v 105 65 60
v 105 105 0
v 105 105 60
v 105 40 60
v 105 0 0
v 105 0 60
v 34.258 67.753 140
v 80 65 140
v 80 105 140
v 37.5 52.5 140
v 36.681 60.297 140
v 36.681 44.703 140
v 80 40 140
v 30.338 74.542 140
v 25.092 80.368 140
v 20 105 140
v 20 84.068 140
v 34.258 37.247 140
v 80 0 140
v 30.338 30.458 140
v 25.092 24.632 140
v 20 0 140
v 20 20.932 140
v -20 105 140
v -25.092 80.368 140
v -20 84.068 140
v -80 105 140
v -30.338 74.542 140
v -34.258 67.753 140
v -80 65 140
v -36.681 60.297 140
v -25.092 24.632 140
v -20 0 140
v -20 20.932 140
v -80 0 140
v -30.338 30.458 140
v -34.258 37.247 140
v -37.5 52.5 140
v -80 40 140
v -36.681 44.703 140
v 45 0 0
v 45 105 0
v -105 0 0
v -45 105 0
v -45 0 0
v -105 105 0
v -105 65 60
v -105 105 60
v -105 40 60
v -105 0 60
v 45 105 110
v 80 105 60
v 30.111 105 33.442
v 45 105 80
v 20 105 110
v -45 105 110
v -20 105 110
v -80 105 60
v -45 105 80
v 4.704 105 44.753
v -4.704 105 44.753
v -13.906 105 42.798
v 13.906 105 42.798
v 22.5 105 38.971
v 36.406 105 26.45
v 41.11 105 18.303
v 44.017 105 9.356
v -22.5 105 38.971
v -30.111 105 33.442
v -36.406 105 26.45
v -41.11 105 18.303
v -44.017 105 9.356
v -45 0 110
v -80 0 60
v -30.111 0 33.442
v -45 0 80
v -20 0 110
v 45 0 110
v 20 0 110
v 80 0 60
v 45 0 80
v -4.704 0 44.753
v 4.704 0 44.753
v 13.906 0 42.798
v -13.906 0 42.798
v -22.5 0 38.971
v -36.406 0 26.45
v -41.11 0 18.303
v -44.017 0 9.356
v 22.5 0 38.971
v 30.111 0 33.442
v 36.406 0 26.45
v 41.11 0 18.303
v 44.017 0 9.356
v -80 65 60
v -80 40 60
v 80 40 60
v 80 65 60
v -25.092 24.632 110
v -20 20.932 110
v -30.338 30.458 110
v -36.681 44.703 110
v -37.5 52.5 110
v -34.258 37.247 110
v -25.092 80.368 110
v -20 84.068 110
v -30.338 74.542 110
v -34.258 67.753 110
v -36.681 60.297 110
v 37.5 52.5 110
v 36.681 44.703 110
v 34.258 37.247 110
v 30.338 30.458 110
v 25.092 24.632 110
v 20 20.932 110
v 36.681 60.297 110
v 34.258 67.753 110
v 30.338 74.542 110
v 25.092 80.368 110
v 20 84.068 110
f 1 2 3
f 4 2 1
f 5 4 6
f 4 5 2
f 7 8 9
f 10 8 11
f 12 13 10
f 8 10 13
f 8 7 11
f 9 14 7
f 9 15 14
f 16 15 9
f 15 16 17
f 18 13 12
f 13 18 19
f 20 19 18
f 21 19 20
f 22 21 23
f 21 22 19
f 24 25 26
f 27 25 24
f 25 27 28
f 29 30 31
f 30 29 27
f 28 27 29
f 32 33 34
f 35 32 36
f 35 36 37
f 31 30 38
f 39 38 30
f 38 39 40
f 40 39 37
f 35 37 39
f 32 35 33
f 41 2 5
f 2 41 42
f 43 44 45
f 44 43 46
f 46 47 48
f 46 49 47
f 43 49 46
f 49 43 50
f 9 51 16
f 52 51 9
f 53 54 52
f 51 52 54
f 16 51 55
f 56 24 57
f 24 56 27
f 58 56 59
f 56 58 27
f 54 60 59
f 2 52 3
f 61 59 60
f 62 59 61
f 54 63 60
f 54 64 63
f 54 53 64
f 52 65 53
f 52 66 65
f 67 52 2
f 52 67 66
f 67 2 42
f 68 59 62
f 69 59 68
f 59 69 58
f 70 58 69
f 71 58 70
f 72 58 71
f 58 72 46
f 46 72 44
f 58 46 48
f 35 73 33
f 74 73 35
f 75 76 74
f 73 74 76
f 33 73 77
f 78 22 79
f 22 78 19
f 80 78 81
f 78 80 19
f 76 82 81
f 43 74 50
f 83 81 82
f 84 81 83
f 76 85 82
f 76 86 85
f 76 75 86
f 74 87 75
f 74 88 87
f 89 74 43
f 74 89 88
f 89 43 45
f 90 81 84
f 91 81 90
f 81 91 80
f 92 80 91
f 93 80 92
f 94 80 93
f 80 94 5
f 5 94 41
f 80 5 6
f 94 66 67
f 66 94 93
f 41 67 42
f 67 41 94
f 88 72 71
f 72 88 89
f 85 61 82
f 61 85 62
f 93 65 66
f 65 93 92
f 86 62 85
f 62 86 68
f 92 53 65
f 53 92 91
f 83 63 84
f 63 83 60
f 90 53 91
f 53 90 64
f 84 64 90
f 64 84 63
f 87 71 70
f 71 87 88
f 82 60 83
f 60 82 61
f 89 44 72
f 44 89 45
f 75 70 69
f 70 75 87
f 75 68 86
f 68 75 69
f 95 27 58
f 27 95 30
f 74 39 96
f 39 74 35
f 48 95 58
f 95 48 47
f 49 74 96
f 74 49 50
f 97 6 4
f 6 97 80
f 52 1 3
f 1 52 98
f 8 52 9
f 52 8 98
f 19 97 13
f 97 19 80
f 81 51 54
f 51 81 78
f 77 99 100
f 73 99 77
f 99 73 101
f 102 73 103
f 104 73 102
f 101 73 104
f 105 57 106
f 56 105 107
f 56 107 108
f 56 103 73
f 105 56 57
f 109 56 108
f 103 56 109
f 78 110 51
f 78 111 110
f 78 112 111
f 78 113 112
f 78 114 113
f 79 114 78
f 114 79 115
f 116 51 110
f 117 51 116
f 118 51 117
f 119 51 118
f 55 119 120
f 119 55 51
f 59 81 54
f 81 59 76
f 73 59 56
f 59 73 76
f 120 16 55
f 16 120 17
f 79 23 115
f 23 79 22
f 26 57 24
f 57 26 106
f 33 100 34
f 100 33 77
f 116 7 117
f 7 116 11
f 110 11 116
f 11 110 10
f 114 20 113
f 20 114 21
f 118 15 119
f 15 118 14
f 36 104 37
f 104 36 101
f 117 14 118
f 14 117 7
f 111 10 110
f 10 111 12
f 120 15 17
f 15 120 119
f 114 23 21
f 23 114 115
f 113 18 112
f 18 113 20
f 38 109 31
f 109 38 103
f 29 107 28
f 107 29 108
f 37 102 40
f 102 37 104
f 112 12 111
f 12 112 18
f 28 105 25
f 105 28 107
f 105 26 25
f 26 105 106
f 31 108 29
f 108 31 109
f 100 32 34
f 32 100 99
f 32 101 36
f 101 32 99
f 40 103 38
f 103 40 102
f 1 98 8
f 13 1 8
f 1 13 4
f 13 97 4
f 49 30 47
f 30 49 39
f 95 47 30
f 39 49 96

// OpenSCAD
centeredCylinderCutRadius = 45;

centerCubeMainWidth = 210;
centerCubeMainDepth = 105;
centerCubeMainHeight = 140;

outsideCubeCutsWidth = 25;
    cubeHeightOffset = 60;
    cubeOffTheTop = 50;

InsideCubeCutHeight = 30;
InsideCubeCutWidth = 90;

centerCubeTallCutDepth = 40;
centerCubeTallCutHeight = 50;

topCylinderCutRadius = 37.50;


difference(){
    translate([ -centerCubeMainWidth / 2, 0, 0])
    cube([centerCubeMainWidth, centerCubeMainDepth, centerCubeMainHeight]);//Stock block
    
    rotate([ -90, 0, 0])
    cylinder(centerCubeMainDepth,r = centeredCylinderCutRadius,true);//Bottum cylinder cut
    
    translate([ -centerCubeMainWidth / 2, 0, cubeHeightOffset])
    cube([outsideCubeCutsWidth, centerCubeMainDepth, centerCubeMainHeight]);//Negative Outer Edge Cut
    
    translate([ centerCubeMainWidth / 2 - outsideCubeCutsWidth, 0, cubeHeightOffset])
    cube([outsideCubeCutsWidth, centerCubeMainDepth, centerCubeMainHeight]);//Negative Outer Edge Cut
    
    translate([-InsideCubeCutWidth / 2, 0,centerCubeMainHeight - cubeHeightOffset])
    cube([InsideCubeCutWidth, centerCubeMainDepth, InsideCubeCutHeight]);// Top Center Cut Wide
    
    translate([-centerCubeTallCutDepth / 2, 0,centerCubeMainHeight - centerCubeTallCutHeight])
    cube([centerCubeTallCutDepth, centerCubeMainDepth, centerCubeTallCutHeight]);// Top Center Cut Tall
    
    translate([0, centerCubeMainDepth / 2, centerCubeMainHeight - centerCubeTallCutHeight])
    cylinder(centerCubeTallCutHeight,r = topCylinderCutRadius);
}


hull(){
    translate([centerCubeMainWidth / 2 -outsideCubeCutsWidth, centerCubeMainDepth / 2 - outsideCubeCutsWidth / 2, cubeHeightOffset - outsideCubeCutsWidth])
    cube([outsideCubeCutsWidth, outsideCubeCutsWidth, outsideCubeCutsWidth]);
    
    translate([centerCubeMainWidth / 2 -outsideCubeCutsWidth * 2, centerCubeMainDepth / 2 - outsideCubeCutsWidth / 2,centerCubeMainHeight - outsideCubeCutsWidth])
    cube([outsideCubeCutsWidth, outsideCubeCutsWidth, outsideCubeCutsWidth]);
    }//Postive X slope triangles
    
    mirror([1,0,0])
    hull(){
    translate([centerCubeMainWidth / 2 -outsideCubeCutsWidth, centerCubeMainDepth / 2 - outsideCubeCutsWidth / 2, cubeHeightOffset - outsideCubeCutsWidth])
    cube([outsideCubeCutsWidth, outsideCubeCutsWidth, outsideCubeCutsWidth]);
    
    translate([centerCubeMainWidth / 2 -outsideCubeCutsWidth * 2, centerCubeMainDepth / 2 - outsideCubeCutsWidth / 2,centerCubeMainHeight - outsideCubeCutsWidth])
    cube([outsideCubeCutsWidth, outsideCubeCutsWidth, outsideCubeCutsWidth]);
    }//Postive X slope triangles
